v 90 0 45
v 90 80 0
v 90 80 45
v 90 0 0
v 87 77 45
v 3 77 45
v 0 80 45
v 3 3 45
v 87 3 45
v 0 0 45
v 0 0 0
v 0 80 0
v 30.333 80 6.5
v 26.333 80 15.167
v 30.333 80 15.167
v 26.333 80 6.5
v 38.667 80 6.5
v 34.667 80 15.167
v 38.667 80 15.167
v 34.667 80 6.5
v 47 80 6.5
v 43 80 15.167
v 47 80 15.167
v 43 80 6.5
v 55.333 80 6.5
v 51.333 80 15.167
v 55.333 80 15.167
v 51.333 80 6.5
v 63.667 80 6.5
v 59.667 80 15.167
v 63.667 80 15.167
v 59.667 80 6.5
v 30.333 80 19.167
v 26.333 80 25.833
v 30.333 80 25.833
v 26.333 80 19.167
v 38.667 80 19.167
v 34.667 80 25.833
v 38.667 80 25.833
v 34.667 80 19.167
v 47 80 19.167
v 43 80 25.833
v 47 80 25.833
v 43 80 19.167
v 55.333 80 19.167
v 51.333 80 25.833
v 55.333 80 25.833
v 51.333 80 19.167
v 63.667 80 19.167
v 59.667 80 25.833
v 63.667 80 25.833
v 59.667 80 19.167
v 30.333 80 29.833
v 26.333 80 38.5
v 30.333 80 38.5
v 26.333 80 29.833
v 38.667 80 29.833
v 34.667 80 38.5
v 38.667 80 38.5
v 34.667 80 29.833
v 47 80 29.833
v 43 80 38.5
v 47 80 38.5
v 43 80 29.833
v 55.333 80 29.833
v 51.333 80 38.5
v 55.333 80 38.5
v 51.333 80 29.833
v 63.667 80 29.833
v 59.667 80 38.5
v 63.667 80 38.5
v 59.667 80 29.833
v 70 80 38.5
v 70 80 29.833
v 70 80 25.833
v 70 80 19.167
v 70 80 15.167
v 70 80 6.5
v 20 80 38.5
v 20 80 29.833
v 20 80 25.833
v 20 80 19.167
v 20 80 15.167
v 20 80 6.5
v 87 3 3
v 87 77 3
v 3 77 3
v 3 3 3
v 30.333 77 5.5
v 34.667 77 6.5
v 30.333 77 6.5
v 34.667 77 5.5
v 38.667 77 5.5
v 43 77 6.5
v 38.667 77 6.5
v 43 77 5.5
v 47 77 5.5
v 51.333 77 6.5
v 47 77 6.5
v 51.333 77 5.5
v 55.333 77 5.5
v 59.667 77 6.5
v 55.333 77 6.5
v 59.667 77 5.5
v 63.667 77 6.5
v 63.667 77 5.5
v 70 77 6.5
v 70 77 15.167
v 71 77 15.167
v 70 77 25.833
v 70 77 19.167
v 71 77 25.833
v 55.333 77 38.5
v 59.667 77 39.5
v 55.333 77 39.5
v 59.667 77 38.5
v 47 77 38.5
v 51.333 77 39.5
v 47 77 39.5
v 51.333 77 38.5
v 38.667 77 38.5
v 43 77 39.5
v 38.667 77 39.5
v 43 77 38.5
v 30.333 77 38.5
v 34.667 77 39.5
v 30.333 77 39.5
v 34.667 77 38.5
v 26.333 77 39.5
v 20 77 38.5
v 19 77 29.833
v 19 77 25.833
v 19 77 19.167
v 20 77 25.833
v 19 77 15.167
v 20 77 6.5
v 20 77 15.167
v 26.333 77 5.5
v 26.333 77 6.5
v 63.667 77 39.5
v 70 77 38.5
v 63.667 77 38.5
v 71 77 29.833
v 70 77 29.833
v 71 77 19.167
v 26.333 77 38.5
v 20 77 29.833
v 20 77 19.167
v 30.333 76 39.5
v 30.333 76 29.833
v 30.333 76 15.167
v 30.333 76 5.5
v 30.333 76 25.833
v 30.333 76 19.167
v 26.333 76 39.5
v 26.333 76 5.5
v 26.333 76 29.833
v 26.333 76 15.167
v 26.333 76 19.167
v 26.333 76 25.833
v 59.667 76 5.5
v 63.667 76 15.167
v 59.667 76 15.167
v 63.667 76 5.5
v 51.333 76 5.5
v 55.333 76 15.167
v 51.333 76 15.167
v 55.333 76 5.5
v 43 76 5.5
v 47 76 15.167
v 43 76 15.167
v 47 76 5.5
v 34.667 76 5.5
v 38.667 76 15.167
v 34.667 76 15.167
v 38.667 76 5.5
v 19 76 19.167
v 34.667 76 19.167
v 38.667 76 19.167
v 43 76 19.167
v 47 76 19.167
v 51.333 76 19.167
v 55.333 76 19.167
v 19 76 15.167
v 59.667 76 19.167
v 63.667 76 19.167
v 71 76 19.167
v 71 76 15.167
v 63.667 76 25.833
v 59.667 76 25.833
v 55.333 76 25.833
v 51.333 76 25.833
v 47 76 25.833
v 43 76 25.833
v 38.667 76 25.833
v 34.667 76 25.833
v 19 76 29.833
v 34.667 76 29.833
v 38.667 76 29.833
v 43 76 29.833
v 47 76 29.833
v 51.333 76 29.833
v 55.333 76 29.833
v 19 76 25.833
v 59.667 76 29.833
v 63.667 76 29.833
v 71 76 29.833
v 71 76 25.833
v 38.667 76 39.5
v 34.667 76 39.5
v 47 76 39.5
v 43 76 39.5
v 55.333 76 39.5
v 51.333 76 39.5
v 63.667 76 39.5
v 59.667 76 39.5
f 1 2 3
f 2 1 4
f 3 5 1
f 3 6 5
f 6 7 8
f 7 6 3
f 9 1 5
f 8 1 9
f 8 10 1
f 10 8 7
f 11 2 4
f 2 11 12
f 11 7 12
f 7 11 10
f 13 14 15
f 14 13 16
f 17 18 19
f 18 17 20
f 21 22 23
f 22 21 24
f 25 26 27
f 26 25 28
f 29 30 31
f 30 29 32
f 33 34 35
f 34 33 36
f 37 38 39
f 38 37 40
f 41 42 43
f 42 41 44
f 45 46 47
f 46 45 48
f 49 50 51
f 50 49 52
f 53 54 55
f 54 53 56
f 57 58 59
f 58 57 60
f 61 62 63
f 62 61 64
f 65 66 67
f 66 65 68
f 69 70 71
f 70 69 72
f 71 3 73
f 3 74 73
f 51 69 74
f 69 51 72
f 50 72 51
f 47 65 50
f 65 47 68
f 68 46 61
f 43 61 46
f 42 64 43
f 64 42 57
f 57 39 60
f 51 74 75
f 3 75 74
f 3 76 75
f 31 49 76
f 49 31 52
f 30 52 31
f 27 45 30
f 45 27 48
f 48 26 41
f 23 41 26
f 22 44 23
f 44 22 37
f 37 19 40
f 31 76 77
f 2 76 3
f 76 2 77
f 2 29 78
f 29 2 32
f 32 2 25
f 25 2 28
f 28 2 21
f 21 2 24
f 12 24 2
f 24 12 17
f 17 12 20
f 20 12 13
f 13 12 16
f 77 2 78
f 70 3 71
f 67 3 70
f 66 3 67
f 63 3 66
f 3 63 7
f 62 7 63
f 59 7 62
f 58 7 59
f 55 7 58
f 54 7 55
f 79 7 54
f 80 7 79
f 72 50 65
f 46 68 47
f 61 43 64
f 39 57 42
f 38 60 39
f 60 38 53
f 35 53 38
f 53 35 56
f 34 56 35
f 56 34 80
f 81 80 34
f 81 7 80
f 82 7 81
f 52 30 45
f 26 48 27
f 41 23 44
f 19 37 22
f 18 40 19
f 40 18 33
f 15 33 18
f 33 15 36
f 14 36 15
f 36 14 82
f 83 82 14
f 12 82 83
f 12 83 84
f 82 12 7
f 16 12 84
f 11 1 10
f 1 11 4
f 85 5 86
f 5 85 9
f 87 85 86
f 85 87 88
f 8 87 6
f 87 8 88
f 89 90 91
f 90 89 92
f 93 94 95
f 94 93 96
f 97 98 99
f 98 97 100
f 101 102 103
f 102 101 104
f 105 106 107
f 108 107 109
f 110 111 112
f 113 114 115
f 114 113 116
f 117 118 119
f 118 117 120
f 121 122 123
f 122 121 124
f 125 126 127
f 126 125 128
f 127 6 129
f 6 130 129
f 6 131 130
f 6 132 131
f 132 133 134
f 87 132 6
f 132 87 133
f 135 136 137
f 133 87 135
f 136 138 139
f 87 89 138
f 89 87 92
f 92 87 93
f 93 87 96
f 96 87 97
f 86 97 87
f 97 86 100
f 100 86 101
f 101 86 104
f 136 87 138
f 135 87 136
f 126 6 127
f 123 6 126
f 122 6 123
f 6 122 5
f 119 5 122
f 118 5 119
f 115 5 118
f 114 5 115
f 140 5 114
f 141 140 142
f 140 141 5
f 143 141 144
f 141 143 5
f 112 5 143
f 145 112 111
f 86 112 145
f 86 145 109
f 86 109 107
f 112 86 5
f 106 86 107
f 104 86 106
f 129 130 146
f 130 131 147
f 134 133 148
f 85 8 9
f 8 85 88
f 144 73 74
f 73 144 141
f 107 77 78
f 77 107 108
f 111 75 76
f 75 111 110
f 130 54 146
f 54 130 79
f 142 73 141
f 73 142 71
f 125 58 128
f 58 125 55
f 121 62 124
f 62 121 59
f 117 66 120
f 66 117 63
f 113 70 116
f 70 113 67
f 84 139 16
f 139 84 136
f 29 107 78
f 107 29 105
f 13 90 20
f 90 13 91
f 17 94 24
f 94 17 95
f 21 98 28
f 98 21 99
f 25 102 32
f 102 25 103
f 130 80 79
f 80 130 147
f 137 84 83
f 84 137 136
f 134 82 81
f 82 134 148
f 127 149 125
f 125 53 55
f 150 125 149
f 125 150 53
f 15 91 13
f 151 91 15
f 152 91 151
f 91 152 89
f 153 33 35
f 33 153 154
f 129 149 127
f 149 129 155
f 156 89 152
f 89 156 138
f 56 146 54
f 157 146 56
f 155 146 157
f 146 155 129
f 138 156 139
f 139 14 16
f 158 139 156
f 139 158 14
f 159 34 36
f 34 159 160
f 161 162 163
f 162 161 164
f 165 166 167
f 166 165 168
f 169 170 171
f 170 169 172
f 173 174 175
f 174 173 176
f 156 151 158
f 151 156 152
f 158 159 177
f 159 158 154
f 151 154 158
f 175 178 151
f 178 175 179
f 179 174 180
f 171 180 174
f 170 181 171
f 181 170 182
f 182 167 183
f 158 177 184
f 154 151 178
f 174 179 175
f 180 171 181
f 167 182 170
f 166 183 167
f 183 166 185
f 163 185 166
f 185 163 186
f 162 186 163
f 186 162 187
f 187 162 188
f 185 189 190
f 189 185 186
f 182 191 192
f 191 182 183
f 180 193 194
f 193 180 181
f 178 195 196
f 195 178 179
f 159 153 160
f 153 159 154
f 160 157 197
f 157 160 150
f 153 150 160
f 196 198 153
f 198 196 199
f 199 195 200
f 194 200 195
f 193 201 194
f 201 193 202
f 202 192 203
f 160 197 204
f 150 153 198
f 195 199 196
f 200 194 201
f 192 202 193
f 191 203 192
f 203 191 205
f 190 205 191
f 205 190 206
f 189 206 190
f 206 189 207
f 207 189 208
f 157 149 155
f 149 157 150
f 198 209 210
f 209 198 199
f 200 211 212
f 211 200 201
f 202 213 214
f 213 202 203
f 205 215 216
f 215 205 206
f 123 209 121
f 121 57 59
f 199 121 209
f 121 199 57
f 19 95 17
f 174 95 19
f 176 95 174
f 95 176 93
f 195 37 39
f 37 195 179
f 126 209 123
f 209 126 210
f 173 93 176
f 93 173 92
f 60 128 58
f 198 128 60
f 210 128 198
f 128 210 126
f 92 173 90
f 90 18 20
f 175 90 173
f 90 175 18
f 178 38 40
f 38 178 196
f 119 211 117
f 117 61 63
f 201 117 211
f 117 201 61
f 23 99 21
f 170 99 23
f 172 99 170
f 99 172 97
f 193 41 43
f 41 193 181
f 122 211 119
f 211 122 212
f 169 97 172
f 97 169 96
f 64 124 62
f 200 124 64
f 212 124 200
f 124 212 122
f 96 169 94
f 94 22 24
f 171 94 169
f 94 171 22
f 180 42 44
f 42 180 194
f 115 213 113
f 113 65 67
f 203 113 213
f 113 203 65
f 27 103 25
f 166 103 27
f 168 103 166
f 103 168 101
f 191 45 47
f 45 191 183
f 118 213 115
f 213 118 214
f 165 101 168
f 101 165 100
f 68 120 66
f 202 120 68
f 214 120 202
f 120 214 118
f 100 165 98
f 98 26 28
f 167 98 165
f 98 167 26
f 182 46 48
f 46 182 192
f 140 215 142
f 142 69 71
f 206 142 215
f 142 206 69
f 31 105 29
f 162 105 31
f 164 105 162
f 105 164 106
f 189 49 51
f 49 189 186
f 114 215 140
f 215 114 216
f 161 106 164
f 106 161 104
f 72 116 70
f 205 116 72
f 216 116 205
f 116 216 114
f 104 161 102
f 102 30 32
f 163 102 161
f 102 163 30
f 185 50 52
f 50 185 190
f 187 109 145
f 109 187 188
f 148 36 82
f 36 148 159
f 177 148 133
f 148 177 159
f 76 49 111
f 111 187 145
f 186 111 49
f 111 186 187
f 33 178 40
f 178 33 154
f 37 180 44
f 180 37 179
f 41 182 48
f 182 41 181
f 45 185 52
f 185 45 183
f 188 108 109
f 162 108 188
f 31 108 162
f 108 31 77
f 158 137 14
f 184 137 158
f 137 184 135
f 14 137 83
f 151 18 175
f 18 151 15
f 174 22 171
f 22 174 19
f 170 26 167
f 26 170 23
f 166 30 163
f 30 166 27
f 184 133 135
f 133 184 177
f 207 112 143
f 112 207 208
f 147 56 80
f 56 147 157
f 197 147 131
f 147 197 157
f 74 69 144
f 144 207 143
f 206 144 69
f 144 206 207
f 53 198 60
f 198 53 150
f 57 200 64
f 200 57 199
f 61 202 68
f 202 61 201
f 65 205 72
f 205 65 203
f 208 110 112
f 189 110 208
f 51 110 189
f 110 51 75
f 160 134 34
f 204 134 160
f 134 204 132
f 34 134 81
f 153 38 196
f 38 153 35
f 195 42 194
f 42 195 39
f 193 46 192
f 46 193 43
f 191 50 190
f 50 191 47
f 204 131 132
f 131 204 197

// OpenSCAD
$fn = 32;

// ----------------------------------------------------------------------
// Vent box: crossgrid enclosure
// ----------------------------------------------------------------------

// --- parameters (mm) ---
box_l = 90;               // box length, X
box_w = 80;               // box width, Y
box_h = 45;               // box height, Z
wall_t = 3;               // shell wall thickness
win_l = 50;               // vent window width, X
win_h = 32;               // vent window height, Z
bar_w = 4;                // grid bar width
n_v = 5;                  // vertical bar count
n_h = 2;                  // horizontal bar count

win_z0 = (box_h - win_h) / 2;  // window lower edge Z
v_step = win_l / (n_v + 1);  // vertical bar step
h_step = win_h / (n_h + 1);  // horizontal bar step

difference() {
  union() {
    difference() {
      cube([box_l, box_w, box_h]);
  translate([wall_t, wall_t, wall_t])
    cube([box_l - 2 * wall_t, box_w - 2 * wall_t, box_h]);
  translate([(box_l - win_l) / 2, box_w - wall_t - 1, win_z0])
    cube([win_l, wall_t + 2, win_h]);
    }
    for (i = [1 : n_v])
      translate([(box_l - win_l) / 2 + i * v_step - bar_w / 2,
                 box_w - wall_t - 1, win_z0 - 1])
        cube([bar_w, wall_t + 1, win_h + 2]);
    for (i = [1 : n_h])
      translate([(box_l - win_l) / 2 - 1, box_w - wall_t - 1,
                 win_z0 + i * h_step - bar_w / 2])
        cube([win_l + 2, wall_t + 1, bar_w]);
  }
}
